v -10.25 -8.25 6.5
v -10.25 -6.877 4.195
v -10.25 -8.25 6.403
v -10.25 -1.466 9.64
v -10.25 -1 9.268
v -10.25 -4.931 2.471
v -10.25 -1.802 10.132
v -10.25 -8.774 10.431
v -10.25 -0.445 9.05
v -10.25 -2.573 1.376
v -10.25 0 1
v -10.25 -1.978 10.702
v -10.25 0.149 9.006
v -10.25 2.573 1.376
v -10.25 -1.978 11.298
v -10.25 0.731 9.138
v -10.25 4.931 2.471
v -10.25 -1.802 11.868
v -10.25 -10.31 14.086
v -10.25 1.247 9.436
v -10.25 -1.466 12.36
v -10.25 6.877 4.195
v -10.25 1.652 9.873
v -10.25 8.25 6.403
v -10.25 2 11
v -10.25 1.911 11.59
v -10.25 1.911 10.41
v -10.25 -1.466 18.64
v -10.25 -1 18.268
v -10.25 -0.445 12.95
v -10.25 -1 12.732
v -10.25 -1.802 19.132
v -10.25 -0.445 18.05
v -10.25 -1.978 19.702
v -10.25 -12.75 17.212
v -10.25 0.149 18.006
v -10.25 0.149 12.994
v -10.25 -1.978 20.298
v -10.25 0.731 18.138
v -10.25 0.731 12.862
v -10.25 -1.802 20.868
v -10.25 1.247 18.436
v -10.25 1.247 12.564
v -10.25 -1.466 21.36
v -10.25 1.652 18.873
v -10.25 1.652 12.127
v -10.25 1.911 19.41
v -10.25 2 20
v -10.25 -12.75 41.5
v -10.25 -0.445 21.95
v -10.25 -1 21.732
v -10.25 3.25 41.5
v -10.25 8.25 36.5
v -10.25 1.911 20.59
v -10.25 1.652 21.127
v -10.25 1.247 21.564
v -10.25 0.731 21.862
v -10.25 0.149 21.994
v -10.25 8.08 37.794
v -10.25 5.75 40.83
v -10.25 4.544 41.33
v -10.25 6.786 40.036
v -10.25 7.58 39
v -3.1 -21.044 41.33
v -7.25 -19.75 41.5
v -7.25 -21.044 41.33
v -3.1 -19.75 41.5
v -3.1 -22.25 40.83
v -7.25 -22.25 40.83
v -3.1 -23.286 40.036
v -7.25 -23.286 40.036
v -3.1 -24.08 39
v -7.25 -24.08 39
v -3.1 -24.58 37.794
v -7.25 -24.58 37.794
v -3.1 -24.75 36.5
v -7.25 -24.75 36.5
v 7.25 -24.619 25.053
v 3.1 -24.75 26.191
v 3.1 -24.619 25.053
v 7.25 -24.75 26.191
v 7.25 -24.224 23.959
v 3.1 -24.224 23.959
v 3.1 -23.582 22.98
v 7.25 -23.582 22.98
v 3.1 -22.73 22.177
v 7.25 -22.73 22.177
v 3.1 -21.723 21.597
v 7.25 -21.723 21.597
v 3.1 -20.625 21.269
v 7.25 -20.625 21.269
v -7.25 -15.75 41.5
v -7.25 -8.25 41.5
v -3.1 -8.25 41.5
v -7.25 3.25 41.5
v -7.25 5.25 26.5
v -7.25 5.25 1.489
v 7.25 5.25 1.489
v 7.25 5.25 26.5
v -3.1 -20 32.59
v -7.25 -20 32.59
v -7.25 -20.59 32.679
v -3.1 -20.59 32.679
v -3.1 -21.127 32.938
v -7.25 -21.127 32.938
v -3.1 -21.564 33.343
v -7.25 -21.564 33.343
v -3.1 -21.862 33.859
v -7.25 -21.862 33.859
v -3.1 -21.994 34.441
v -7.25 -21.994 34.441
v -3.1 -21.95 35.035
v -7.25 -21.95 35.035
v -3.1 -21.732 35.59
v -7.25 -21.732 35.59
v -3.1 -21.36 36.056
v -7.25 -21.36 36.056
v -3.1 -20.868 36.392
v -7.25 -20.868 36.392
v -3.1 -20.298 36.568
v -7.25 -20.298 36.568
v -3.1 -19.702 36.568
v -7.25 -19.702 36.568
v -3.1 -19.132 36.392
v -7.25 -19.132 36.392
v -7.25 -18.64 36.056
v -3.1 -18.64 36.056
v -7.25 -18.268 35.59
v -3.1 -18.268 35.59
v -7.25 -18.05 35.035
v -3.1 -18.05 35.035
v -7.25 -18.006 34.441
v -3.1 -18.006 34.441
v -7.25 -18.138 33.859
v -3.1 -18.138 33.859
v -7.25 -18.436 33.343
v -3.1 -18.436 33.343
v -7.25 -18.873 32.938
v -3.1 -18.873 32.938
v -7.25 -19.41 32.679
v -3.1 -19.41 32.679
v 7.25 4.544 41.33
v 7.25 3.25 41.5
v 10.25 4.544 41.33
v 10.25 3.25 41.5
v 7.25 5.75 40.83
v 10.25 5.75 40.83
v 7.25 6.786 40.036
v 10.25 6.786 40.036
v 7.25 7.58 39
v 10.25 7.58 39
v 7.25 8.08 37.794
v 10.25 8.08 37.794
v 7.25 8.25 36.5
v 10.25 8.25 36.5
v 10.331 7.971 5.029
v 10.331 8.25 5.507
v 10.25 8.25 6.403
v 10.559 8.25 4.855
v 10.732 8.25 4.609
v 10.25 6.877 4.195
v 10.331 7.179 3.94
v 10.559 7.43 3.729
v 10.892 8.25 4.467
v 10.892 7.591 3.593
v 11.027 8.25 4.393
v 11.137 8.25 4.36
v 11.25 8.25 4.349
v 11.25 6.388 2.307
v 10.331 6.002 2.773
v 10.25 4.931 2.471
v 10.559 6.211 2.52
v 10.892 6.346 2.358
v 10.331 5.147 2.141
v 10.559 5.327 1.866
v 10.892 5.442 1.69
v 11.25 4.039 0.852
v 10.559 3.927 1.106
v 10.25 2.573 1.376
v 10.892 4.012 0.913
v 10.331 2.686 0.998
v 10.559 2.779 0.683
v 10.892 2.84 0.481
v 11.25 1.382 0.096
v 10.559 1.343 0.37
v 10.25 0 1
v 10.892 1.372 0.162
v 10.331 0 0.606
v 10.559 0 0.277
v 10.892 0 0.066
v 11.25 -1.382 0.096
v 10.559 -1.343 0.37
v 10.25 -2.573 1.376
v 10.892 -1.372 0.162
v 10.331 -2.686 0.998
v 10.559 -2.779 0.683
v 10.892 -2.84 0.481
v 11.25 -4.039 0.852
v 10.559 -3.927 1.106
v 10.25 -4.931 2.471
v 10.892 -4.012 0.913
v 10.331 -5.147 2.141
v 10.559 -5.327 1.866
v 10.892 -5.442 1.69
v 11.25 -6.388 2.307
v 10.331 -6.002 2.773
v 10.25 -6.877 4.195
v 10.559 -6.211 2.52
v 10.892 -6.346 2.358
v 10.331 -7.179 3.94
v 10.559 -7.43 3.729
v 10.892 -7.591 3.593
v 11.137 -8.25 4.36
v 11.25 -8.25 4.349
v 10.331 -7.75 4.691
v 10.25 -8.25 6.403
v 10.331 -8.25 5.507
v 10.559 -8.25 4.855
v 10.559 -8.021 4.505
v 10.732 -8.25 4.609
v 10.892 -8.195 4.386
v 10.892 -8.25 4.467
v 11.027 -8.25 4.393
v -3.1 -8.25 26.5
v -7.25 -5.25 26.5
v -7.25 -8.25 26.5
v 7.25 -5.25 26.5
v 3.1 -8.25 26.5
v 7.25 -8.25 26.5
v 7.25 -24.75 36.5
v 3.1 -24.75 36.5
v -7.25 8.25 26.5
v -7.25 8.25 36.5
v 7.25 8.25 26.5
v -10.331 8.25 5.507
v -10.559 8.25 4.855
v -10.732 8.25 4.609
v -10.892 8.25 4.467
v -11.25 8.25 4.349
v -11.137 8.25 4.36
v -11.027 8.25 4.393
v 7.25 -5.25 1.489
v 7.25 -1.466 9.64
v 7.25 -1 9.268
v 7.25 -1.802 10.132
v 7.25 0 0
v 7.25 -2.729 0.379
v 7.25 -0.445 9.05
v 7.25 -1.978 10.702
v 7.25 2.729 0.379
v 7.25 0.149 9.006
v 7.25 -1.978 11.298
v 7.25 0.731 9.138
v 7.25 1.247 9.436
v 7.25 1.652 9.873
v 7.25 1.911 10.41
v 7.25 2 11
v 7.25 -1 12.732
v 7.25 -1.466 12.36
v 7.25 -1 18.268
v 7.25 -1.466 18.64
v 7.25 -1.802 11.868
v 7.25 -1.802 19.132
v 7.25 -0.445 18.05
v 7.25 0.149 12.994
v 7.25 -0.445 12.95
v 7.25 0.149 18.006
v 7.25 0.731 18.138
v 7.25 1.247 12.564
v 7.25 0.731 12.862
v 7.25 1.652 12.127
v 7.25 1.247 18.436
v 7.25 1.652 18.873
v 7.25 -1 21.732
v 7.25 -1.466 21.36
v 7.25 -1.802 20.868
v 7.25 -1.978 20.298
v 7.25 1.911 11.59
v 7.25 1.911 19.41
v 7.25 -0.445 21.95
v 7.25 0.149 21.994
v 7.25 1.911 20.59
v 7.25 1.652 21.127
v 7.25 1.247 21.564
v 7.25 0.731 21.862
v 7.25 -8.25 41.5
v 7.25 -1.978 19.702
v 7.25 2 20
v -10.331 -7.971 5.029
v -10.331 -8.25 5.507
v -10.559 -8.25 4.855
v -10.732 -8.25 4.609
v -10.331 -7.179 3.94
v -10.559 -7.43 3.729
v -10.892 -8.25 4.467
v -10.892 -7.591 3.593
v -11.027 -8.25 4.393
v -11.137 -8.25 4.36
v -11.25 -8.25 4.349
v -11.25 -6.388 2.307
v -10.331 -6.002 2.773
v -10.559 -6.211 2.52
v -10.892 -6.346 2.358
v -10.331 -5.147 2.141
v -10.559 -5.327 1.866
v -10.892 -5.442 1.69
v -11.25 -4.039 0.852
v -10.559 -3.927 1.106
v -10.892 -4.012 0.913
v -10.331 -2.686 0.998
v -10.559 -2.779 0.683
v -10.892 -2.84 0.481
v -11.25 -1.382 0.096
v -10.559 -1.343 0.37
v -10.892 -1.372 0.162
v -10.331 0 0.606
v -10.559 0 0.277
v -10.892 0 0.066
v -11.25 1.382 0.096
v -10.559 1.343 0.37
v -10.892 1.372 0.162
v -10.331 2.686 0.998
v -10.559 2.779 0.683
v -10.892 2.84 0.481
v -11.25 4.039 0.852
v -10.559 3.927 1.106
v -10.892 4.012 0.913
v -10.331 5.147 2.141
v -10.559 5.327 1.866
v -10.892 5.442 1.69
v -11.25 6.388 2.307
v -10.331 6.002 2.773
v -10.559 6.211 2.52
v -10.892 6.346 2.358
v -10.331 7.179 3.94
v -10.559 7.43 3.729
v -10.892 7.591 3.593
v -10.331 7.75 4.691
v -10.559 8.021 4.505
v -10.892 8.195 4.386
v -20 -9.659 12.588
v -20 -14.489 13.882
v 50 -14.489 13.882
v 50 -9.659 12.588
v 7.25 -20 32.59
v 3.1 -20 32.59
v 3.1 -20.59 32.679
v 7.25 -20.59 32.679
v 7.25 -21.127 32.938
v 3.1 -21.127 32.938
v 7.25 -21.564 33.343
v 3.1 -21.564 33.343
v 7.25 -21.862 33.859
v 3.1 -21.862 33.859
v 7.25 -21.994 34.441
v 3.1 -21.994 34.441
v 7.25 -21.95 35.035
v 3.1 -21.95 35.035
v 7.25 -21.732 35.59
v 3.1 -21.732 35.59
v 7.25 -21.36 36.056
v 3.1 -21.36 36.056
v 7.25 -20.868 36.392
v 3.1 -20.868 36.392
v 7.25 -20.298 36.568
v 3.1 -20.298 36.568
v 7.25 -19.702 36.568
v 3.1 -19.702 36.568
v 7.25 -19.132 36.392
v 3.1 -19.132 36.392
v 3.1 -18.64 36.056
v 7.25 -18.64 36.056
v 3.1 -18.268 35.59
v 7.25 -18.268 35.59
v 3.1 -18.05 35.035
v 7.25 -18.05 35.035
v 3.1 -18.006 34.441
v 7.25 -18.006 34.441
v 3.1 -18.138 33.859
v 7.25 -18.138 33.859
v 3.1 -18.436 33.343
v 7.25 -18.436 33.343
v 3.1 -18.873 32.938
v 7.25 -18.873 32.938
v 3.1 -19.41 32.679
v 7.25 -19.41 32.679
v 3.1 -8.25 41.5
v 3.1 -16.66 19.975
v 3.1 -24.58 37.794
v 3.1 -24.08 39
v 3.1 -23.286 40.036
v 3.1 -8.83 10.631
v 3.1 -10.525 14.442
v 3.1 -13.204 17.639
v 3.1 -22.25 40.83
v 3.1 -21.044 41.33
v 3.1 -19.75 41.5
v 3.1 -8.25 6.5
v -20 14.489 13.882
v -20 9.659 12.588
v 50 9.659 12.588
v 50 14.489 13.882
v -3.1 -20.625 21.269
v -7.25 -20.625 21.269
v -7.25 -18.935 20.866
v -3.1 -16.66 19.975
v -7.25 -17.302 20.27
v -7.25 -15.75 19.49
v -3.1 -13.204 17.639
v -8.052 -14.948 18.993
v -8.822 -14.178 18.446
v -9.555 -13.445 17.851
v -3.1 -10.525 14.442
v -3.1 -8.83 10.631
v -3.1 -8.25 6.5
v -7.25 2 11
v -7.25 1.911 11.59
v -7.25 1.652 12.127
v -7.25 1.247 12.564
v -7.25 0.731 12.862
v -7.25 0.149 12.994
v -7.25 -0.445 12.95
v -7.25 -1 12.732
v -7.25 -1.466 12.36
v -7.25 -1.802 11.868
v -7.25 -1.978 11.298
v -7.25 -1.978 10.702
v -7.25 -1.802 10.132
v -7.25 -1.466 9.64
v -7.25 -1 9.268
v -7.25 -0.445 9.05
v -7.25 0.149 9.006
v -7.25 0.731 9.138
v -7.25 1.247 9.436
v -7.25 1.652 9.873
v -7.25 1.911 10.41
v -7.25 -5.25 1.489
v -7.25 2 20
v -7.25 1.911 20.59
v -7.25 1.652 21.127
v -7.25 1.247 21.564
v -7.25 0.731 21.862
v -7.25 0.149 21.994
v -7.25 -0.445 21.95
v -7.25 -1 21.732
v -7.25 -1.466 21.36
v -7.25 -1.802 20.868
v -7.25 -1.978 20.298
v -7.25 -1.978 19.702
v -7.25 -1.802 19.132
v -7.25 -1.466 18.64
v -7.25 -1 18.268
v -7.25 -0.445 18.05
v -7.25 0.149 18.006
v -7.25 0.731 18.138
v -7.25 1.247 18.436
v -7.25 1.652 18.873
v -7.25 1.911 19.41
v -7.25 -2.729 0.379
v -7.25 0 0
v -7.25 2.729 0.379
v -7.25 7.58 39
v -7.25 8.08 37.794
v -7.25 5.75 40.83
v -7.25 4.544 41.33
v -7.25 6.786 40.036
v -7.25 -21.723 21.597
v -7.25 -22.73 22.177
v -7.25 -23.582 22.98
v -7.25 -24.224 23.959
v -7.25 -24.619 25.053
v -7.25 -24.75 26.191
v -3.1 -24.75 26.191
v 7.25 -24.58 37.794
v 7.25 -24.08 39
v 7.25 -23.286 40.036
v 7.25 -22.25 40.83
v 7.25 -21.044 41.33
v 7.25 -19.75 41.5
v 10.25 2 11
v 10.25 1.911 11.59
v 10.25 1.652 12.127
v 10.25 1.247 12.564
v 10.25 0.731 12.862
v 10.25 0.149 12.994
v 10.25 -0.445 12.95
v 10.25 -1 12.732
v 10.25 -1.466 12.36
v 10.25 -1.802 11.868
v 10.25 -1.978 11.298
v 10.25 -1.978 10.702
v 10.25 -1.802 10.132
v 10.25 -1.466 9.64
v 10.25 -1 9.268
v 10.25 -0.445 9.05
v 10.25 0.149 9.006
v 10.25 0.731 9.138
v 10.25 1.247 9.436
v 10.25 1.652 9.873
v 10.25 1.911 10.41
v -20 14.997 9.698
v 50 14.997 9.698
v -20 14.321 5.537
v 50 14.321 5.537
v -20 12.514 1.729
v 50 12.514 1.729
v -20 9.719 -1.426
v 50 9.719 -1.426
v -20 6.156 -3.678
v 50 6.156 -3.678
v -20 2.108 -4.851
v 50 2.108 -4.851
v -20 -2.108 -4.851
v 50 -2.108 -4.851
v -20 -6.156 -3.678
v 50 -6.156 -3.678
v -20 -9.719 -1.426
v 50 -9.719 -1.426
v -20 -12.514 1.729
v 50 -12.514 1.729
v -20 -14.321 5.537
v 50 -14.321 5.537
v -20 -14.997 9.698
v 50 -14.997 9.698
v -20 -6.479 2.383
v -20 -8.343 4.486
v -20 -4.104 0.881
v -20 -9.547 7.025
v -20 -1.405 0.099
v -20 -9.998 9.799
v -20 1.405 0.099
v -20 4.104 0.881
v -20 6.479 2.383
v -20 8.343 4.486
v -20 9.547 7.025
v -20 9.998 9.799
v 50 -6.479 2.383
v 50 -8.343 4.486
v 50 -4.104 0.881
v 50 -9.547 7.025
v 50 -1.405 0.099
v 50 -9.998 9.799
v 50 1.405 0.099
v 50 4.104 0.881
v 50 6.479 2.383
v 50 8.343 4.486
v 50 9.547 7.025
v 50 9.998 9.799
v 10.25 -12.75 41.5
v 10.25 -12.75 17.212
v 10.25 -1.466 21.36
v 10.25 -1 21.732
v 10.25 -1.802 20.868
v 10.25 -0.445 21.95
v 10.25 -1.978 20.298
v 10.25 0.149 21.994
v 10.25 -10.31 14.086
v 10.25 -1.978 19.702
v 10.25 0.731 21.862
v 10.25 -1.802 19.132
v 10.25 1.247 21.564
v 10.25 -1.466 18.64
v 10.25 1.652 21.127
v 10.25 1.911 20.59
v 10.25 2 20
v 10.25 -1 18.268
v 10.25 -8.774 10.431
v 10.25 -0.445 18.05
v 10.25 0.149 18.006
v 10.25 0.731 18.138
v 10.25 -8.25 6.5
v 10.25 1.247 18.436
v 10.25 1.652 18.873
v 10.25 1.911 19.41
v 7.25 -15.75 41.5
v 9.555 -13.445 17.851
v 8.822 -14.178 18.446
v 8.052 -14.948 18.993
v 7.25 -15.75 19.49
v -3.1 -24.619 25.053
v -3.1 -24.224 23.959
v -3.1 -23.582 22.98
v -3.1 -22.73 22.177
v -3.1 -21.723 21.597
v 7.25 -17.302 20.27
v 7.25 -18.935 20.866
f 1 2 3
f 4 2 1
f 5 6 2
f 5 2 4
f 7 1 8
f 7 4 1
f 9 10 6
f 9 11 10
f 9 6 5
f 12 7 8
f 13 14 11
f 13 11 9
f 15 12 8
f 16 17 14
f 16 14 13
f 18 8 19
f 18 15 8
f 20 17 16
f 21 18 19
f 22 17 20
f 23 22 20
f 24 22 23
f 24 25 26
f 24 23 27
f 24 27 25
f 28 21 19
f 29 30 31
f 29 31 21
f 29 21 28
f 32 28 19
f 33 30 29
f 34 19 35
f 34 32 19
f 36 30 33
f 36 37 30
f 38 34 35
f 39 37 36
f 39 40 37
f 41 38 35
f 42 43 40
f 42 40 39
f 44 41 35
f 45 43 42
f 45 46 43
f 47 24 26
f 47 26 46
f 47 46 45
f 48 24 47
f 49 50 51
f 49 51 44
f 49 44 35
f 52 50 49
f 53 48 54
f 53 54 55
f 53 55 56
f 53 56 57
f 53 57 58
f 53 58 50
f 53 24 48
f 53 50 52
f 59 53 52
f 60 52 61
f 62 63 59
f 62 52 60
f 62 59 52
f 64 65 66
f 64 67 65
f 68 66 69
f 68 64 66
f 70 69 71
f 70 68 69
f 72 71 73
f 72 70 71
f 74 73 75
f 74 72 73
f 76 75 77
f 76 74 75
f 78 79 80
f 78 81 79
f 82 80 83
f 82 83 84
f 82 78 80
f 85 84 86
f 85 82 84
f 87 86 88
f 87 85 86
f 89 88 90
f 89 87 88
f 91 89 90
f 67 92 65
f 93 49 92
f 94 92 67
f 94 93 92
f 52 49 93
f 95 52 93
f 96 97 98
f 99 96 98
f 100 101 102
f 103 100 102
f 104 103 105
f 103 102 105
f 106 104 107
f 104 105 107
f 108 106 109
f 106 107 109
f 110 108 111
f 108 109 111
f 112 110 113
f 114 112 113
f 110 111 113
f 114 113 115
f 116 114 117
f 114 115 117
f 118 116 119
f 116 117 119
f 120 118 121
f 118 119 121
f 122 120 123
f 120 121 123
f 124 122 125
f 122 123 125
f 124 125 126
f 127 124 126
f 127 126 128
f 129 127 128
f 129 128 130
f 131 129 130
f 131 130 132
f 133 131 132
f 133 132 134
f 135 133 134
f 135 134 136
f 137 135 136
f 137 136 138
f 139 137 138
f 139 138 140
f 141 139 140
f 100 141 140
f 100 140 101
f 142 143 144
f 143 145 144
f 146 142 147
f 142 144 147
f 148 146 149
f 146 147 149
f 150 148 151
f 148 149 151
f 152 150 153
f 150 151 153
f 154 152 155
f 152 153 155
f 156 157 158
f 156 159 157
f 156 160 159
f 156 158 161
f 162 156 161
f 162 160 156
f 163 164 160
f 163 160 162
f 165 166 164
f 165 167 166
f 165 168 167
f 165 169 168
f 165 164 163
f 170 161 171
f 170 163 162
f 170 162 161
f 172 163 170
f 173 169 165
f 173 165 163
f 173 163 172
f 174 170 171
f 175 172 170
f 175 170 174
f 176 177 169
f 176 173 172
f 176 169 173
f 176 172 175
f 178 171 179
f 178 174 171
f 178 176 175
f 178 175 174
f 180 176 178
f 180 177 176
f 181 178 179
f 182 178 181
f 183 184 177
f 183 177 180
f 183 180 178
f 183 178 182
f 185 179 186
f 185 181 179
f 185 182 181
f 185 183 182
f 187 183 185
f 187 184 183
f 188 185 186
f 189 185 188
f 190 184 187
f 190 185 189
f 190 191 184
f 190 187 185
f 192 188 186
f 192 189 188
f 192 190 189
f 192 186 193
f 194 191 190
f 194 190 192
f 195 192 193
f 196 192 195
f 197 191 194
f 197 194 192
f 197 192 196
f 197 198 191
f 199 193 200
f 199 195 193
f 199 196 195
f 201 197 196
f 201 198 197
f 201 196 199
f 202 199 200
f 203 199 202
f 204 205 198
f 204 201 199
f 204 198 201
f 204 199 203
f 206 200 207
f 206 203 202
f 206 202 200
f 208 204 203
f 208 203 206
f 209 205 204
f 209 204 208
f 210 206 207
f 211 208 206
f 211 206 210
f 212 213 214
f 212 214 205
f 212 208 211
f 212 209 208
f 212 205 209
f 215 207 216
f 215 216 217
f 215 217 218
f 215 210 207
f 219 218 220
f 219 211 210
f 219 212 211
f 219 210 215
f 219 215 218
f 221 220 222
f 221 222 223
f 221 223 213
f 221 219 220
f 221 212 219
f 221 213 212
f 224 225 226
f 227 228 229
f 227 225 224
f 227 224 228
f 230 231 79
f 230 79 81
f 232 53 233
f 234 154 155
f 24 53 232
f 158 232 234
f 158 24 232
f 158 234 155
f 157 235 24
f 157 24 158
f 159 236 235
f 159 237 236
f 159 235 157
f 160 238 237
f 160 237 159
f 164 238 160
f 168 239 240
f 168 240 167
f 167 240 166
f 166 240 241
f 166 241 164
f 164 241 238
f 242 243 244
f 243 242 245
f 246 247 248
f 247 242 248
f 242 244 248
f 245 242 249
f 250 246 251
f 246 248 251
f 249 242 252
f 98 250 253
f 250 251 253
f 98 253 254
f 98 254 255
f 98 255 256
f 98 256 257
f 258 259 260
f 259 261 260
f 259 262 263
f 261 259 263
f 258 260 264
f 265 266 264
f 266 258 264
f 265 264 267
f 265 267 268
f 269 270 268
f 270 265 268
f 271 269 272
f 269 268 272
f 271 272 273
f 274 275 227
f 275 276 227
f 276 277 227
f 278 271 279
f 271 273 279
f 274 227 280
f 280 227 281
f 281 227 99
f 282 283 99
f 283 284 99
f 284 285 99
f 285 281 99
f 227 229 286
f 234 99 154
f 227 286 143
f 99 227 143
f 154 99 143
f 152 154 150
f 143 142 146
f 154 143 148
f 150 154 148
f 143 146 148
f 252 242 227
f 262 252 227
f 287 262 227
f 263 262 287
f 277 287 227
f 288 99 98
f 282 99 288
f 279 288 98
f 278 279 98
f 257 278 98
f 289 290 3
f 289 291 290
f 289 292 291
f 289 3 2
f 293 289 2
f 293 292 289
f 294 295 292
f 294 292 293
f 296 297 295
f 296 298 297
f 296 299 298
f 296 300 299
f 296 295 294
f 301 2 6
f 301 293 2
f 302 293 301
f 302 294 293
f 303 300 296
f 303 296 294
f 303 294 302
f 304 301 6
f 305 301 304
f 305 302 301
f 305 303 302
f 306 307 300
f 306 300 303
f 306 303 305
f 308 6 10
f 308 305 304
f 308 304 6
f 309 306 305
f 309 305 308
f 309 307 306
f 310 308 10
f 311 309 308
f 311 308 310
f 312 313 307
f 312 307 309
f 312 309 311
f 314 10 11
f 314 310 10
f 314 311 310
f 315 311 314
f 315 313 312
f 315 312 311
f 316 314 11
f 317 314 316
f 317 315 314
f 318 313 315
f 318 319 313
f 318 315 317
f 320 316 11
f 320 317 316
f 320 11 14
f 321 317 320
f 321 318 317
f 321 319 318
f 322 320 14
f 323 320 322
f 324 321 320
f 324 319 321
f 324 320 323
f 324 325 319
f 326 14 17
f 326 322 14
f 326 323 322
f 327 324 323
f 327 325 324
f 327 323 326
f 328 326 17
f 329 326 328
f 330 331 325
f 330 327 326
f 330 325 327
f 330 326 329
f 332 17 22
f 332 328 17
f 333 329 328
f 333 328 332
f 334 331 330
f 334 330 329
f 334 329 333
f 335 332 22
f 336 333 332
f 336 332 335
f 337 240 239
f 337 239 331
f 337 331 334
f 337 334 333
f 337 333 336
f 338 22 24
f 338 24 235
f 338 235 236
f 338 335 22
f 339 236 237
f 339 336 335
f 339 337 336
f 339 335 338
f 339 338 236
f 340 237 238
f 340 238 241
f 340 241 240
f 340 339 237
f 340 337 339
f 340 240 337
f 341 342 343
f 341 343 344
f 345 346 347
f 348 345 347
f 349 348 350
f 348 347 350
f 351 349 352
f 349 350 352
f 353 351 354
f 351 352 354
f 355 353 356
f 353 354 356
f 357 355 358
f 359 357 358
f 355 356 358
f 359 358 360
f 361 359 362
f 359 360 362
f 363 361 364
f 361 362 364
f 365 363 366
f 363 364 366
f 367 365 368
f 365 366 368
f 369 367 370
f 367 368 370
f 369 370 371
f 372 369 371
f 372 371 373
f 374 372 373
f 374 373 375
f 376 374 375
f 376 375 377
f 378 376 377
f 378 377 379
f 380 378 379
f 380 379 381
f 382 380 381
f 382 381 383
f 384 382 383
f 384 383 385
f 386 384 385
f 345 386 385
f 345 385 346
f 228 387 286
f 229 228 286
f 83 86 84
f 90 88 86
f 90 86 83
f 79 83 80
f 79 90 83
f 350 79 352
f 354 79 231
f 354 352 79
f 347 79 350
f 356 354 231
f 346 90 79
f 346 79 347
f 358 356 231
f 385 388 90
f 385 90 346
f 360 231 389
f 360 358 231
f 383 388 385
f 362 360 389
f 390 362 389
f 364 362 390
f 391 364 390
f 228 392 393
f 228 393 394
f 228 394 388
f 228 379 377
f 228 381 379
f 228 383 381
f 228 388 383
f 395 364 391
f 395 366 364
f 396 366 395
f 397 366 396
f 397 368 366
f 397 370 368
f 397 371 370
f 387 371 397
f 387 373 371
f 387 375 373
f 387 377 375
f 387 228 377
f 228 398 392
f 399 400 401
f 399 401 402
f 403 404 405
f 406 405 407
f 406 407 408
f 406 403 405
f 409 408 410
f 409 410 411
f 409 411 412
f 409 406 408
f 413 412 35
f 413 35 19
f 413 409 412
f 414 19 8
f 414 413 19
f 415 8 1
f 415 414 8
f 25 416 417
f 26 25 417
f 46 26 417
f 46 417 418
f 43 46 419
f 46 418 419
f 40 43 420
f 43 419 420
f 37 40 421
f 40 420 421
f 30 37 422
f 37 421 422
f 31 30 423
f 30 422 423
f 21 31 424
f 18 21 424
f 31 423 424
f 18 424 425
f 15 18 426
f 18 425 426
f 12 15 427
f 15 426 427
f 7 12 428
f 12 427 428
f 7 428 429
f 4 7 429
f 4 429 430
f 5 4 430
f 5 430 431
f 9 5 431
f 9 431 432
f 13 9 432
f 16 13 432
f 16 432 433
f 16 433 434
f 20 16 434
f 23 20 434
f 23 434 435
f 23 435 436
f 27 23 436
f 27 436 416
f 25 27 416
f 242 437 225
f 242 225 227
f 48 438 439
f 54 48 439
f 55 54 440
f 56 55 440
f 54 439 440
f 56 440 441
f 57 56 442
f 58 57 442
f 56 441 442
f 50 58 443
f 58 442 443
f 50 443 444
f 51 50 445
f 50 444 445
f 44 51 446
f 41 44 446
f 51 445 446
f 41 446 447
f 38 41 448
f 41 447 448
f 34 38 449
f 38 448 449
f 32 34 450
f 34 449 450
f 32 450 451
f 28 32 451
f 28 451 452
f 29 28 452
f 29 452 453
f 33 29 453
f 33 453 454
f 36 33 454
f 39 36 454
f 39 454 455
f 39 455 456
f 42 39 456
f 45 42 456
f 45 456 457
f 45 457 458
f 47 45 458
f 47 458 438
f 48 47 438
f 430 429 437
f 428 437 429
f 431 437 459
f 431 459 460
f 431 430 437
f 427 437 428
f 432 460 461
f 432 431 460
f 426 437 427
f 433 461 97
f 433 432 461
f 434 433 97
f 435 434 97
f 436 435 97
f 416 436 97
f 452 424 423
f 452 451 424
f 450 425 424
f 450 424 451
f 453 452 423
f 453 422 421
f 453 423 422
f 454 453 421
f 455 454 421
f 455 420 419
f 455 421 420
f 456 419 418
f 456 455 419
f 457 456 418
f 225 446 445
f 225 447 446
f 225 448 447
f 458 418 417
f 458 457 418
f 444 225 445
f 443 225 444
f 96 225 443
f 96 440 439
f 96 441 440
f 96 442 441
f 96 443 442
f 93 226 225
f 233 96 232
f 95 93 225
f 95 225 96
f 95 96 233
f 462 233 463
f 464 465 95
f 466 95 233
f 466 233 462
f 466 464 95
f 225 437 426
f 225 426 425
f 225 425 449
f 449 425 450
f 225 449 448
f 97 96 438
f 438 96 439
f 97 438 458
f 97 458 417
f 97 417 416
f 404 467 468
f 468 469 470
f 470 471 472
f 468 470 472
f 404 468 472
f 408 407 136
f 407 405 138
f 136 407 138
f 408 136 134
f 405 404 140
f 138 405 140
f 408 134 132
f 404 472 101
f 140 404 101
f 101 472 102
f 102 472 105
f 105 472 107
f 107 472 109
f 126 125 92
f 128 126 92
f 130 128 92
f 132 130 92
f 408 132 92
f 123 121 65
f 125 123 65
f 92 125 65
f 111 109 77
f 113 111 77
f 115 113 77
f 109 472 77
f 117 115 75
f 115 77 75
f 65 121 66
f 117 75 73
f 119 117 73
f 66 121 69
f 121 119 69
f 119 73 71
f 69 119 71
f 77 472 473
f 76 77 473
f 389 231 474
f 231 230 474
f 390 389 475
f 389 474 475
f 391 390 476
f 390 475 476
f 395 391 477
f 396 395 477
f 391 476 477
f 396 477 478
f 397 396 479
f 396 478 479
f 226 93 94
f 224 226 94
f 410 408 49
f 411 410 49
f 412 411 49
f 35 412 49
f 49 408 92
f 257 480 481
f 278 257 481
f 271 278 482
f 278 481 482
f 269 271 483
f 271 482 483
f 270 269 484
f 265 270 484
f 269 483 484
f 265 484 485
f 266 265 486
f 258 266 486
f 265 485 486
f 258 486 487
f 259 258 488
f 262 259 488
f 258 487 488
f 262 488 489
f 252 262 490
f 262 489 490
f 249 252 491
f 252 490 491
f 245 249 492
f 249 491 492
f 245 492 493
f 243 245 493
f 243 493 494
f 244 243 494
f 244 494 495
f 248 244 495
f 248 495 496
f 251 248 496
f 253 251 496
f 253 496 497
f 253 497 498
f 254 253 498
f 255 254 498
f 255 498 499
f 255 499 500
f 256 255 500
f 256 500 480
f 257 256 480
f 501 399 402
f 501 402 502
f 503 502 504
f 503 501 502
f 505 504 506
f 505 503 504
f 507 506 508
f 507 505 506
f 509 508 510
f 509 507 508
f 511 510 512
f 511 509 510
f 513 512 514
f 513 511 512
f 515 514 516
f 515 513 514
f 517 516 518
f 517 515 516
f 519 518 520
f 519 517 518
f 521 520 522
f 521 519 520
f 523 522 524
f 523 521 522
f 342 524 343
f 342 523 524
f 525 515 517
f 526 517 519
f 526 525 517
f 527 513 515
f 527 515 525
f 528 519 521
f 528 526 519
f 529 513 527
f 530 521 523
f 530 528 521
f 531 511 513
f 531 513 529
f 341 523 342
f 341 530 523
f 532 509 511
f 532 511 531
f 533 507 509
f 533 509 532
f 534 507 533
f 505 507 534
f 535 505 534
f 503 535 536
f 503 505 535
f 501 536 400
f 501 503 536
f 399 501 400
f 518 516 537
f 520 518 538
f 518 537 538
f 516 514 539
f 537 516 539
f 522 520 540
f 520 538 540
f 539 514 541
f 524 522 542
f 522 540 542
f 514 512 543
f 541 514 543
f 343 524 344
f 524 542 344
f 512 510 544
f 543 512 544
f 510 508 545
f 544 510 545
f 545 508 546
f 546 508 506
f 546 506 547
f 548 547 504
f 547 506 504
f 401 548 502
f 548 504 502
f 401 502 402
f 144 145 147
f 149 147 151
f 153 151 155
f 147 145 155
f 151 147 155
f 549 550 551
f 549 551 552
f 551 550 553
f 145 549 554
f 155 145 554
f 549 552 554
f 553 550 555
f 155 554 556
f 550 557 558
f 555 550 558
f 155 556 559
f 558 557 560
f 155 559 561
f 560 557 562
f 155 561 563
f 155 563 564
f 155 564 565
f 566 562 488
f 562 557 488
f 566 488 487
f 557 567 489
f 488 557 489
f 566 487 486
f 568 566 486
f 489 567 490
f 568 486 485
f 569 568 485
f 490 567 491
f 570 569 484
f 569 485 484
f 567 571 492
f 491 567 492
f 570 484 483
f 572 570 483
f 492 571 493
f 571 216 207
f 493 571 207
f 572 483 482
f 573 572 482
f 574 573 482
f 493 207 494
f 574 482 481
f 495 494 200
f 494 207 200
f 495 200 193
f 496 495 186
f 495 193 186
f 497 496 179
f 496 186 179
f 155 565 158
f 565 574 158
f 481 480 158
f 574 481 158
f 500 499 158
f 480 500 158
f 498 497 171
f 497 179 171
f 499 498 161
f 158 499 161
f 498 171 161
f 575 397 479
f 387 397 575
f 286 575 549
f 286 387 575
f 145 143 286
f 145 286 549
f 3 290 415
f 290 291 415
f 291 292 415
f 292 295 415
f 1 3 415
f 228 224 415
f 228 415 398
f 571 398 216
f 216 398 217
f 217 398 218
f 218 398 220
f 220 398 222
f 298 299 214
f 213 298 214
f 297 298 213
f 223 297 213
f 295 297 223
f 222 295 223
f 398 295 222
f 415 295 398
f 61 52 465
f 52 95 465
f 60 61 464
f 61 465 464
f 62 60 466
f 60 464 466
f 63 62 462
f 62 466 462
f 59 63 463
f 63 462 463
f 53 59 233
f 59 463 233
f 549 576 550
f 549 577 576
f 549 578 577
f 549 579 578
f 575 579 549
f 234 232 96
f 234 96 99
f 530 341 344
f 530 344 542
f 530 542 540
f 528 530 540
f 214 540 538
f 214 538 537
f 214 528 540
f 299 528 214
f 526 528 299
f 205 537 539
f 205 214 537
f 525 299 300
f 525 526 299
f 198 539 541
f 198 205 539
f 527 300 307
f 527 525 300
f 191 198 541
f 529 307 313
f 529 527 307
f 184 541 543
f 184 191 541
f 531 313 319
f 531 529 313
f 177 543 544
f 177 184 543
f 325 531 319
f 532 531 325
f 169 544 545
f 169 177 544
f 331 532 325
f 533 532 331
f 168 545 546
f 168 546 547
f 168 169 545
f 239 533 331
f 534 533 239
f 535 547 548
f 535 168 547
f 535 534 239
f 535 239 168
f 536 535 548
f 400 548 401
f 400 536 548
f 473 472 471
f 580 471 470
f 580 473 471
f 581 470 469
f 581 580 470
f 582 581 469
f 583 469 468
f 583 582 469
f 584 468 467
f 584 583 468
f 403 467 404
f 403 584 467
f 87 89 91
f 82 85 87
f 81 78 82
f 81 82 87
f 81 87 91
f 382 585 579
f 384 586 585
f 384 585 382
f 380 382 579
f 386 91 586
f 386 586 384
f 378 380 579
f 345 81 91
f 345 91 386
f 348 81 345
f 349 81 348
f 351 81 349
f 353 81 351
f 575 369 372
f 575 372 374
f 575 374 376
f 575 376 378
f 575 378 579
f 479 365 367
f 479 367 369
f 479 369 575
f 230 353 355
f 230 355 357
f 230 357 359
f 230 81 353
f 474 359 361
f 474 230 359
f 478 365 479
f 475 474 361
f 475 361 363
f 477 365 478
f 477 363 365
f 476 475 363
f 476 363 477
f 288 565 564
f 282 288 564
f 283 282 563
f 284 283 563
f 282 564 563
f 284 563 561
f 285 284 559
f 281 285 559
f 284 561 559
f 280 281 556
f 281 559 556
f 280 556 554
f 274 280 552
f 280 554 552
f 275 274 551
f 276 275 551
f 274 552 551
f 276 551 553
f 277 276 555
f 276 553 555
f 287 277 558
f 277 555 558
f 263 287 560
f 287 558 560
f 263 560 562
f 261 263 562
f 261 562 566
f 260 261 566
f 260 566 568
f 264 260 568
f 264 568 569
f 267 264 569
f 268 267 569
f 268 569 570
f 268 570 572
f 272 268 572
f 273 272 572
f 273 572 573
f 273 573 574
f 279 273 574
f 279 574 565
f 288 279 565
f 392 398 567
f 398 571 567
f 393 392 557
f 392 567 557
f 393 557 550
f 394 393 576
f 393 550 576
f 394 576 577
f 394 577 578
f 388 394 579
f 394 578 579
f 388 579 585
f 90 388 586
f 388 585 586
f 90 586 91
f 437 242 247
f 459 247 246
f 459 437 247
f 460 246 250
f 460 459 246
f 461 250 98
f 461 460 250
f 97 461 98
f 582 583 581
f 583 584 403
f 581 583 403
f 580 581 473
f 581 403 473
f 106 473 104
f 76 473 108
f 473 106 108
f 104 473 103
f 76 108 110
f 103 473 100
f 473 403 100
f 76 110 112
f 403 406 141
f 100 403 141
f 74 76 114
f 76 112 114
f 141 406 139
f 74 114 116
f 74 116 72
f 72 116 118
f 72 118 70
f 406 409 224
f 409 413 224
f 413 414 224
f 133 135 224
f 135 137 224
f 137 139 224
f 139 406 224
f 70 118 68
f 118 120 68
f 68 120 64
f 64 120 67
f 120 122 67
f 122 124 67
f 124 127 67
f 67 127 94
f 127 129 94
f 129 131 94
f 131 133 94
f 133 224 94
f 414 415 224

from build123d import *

# Parameters (mm, degrees)
SKETCH1_W                = 20.5
SKETCH1_H                = 16.5
SKETCH1_W_2              = 14.5
SKETCH1_H_2              = 10.5
BOSS_EXTRUDE1_DEPTH      = 41.5
SKETCH2_W                = 14.5
SKETCH2_H                = 3
CUT_EXTRUDE1_DEPTH       = 15
BOSS_EXTRUDE2_DEPTH      = 50
BOSS_EXTRUDE2_DEPTH_BACK = 20
SKETCH5_R                = 2
CUT_EXTRUDE2_DEPTH       = 25
SKETCH12_W               = 7.15
SKETCH12_H               = 20
BOSS_EXTRUDE16_DEPTH     = 16.5
SKETCH13_W               = 3
SKETCH13_H               = 20
CUT_EXTRUDE5_DEPTH       = 12
CHAMFER1_SIZE            = 3
FILLET6_R                = 15
FILLET7_R                = 5
SKETCH7_R                = 2
CUT_EXTRUDE6_DEPTH       = 78.232603305
FILLET14_R               = 1


with BuildPart() as part:
    # Sketch1 → Boss-Extrude1 (new body)
    with BuildSketch(Plane.XY):
        Rectangle(SKETCH1_W, SKETCH1_H)
        Rectangle(SKETCH1_W_2, SKETCH1_H_2, mode=Mode.SUBTRACT)
    extrude(amount=BOSS_EXTRUDE1_DEPTH)

    # Sketch2 → Cut-Extrude1 (cut)
    with BuildSketch(Plane.XY.offset(41.5)):
        with Locations((0, 6.75)):
            Rectangle(SKETCH2_W, SKETCH2_H)
        with Locations((0, -6.75)):
            Rectangle(SKETCH2_W, SKETCH2_H)
    extrude(amount=-CUT_EXTRUDE1_DEPTH, mode=Mode.SUBTRACT)

    # Sketch3 → Boss-Extrude2 (add, two sides: drawn at the far end of the back side and taken through both)
    with BuildSketch(Plane(origin=(0, 0, 0), x_dir=(0, 0, -1), z_dir=(1, 0, 0)).offset(-BOSS_EXTRUDE2_DEPTH_BACK)):
        with BuildLine():
            Line((-13.882285677, -14.488887394), (-12.588190451, -9.659258263))
            ThreePointArc((-12.588190451, -9.659258263), (0, 0), (-12.588190451, 9.659258263))
            Line((-12.588190451, 9.659258263), (-13.882285677, 14.488887394))
            ThreePointArc((-13.882285677, 14.488887394), (5, 0), (-13.882285677, -14.488887394))
        make_face()
    extrude(amount=BOSS_EXTRUDE2_DEPTH + BOSS_EXTRUDE2_DEPTH_BACK)

    # Sketch5 → Cut-Extrude2 (cut)
    with BuildSketch(Plane(origin=(10.25, 0, 0), x_dir=(0, 0, -1), z_dir=(1, 0, 0))):
        with Locations(Location((-20, 0, 0), (0, 0, 90))):
            Circle(SKETCH5_R)
        with Locations(Location((-11, 0, 0), (0, 0, 90))):
            Circle(SKETCH5_R)
    extrude(amount=-CUT_EXTRUDE2_DEPTH, mode=Mode.SUBTRACT)

    # Sketch12 → Boss-Extrude16 (add)
    with BuildSketch(Plane.XZ.offset(8.25)):
        with Locations((-6.675, 31.5)):
            Rectangle(SKETCH12_W, SKETCH12_H)
        with Locations((6.675, 31.5)):
            Rectangle(SKETCH12_W, SKETCH12_H)
    extrude(amount=BOSS_EXTRUDE16_DEPTH)

    # Sketch13 → Cut-Extrude5 (cut)
    with BuildSketch(Plane.XZ.offset(24.75)):
        with Locations((-8.75, 31.5)):
            Rectangle(SKETCH13_W, SKETCH13_H)
        with Locations((8.75, 31.5)):
            Rectangle(SKETCH13_W, SKETCH13_H)
    extrude(amount=-CUT_EXTRUDE5_DEPTH, mode=Mode.SUBTRACT)

    # Chamfer1
    chamfer1_edges = [part.edges().sort_by_distance(p)[0] for p in [
        (7.25, -12.75, 31.5),
        (-7.25, -12.75, 31.5),
    ]]
    chamfer(chamfer1_edges, length=CHAMFER1_SIZE - 0.0001)  # a hair under: the kernel refuses the full size

    # Fillet6
    fillet6_edges = [part.edges().sort_by_distance(p)[0] for p in [
        (6.675, -8.25, 21.5),
        (-6.675, -8.25, 21.5),
    ]]
    fillet(fillet6_edges, radius=FILLET6_R)

    # Fillet7
    fillet7_edges = [part.edges().sort_by_distance(p)[0] for p in [
        (8.75, 8.25, 41.5),
        (-8.75, 8.25, 41.5),
        (5.175, -24.75, 21.5),
        (5.175, -24.75, 41.5),
        (-5.175, -24.75, 41.5),
        (-5.175, -24.75, 21.5),
    ]]
    fillet(fillet7_edges, radius=FILLET7_R)

    # Sketch7 → Cut-Extrude6 (cut, through all)
    with BuildSketch(Plane.ZY.offset(10.25)):
        with Locations(Location((34.590169944, -20, 0), (0, 0, 180))):
            Circle(SKETCH7_R)
    extrude(amount=-CUT_EXTRUDE6_DEPTH, mode=Mode.SUBTRACT)

    # Fillet14
    fillet14_edges = [part.edges().sort_by_distance(p)[0] for p in [
        (10.25, 0, 0),
        (-10.25, 0, 0),
    ]]
    fillet(fillet14_edges, radius=FILLET14_R)


solid = part.part
